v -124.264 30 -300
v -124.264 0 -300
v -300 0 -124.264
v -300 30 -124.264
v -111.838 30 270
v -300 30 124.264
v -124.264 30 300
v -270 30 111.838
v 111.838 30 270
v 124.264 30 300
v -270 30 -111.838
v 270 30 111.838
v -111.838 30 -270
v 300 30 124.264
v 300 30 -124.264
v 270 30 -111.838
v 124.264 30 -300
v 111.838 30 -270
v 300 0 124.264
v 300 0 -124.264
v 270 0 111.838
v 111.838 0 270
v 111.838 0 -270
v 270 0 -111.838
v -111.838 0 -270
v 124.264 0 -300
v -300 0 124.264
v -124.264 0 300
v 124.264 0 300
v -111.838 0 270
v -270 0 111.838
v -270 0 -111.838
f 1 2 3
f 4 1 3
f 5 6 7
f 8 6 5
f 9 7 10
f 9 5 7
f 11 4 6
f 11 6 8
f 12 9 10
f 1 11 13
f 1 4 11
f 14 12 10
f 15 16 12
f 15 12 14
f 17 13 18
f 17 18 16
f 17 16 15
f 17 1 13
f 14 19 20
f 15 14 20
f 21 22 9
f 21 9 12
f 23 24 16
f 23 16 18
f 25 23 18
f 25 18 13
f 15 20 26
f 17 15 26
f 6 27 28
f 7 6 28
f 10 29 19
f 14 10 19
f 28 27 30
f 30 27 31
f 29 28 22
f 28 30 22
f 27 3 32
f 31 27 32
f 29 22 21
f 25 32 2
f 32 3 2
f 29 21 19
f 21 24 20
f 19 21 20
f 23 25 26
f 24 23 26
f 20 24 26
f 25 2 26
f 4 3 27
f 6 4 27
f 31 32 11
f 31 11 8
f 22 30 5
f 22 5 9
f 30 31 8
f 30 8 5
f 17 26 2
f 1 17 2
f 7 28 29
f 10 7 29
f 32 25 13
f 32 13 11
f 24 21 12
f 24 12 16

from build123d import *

# Parameters (mm, degrees)
SALIENTE_EXTRUIR1_DEPTH = 30


with BuildPart() as part:
    # Croquis1 → Saliente-Extruir1 (new body)
    with BuildSketch(Plane(origin=(0, 0, 0), x_dir=(1, 0, 0), z_dir=(0, 1, 0))):
        Polygon((300, -124.264068712), (300, 124.264068712), (124.264068712, 300), (-124.264068712, 300), (-300, 124.264068712), (-300, -124.264068712), (-124.264068712, -300), (124.264068712, -300), align=None)
        Polygon((270, -111.837661841), (270, 111.837661841), (111.837661841, 270), (-111.837661841, 270), (-270, 111.837661841), (-270, -111.837661841), (-111.837661841, -270), (111.837661841, -270), align=None, mode=Mode.SUBTRACT)
    extrude(amount=SALIENTE_EXTRUIR1_DEPTH)


solid = part.part
